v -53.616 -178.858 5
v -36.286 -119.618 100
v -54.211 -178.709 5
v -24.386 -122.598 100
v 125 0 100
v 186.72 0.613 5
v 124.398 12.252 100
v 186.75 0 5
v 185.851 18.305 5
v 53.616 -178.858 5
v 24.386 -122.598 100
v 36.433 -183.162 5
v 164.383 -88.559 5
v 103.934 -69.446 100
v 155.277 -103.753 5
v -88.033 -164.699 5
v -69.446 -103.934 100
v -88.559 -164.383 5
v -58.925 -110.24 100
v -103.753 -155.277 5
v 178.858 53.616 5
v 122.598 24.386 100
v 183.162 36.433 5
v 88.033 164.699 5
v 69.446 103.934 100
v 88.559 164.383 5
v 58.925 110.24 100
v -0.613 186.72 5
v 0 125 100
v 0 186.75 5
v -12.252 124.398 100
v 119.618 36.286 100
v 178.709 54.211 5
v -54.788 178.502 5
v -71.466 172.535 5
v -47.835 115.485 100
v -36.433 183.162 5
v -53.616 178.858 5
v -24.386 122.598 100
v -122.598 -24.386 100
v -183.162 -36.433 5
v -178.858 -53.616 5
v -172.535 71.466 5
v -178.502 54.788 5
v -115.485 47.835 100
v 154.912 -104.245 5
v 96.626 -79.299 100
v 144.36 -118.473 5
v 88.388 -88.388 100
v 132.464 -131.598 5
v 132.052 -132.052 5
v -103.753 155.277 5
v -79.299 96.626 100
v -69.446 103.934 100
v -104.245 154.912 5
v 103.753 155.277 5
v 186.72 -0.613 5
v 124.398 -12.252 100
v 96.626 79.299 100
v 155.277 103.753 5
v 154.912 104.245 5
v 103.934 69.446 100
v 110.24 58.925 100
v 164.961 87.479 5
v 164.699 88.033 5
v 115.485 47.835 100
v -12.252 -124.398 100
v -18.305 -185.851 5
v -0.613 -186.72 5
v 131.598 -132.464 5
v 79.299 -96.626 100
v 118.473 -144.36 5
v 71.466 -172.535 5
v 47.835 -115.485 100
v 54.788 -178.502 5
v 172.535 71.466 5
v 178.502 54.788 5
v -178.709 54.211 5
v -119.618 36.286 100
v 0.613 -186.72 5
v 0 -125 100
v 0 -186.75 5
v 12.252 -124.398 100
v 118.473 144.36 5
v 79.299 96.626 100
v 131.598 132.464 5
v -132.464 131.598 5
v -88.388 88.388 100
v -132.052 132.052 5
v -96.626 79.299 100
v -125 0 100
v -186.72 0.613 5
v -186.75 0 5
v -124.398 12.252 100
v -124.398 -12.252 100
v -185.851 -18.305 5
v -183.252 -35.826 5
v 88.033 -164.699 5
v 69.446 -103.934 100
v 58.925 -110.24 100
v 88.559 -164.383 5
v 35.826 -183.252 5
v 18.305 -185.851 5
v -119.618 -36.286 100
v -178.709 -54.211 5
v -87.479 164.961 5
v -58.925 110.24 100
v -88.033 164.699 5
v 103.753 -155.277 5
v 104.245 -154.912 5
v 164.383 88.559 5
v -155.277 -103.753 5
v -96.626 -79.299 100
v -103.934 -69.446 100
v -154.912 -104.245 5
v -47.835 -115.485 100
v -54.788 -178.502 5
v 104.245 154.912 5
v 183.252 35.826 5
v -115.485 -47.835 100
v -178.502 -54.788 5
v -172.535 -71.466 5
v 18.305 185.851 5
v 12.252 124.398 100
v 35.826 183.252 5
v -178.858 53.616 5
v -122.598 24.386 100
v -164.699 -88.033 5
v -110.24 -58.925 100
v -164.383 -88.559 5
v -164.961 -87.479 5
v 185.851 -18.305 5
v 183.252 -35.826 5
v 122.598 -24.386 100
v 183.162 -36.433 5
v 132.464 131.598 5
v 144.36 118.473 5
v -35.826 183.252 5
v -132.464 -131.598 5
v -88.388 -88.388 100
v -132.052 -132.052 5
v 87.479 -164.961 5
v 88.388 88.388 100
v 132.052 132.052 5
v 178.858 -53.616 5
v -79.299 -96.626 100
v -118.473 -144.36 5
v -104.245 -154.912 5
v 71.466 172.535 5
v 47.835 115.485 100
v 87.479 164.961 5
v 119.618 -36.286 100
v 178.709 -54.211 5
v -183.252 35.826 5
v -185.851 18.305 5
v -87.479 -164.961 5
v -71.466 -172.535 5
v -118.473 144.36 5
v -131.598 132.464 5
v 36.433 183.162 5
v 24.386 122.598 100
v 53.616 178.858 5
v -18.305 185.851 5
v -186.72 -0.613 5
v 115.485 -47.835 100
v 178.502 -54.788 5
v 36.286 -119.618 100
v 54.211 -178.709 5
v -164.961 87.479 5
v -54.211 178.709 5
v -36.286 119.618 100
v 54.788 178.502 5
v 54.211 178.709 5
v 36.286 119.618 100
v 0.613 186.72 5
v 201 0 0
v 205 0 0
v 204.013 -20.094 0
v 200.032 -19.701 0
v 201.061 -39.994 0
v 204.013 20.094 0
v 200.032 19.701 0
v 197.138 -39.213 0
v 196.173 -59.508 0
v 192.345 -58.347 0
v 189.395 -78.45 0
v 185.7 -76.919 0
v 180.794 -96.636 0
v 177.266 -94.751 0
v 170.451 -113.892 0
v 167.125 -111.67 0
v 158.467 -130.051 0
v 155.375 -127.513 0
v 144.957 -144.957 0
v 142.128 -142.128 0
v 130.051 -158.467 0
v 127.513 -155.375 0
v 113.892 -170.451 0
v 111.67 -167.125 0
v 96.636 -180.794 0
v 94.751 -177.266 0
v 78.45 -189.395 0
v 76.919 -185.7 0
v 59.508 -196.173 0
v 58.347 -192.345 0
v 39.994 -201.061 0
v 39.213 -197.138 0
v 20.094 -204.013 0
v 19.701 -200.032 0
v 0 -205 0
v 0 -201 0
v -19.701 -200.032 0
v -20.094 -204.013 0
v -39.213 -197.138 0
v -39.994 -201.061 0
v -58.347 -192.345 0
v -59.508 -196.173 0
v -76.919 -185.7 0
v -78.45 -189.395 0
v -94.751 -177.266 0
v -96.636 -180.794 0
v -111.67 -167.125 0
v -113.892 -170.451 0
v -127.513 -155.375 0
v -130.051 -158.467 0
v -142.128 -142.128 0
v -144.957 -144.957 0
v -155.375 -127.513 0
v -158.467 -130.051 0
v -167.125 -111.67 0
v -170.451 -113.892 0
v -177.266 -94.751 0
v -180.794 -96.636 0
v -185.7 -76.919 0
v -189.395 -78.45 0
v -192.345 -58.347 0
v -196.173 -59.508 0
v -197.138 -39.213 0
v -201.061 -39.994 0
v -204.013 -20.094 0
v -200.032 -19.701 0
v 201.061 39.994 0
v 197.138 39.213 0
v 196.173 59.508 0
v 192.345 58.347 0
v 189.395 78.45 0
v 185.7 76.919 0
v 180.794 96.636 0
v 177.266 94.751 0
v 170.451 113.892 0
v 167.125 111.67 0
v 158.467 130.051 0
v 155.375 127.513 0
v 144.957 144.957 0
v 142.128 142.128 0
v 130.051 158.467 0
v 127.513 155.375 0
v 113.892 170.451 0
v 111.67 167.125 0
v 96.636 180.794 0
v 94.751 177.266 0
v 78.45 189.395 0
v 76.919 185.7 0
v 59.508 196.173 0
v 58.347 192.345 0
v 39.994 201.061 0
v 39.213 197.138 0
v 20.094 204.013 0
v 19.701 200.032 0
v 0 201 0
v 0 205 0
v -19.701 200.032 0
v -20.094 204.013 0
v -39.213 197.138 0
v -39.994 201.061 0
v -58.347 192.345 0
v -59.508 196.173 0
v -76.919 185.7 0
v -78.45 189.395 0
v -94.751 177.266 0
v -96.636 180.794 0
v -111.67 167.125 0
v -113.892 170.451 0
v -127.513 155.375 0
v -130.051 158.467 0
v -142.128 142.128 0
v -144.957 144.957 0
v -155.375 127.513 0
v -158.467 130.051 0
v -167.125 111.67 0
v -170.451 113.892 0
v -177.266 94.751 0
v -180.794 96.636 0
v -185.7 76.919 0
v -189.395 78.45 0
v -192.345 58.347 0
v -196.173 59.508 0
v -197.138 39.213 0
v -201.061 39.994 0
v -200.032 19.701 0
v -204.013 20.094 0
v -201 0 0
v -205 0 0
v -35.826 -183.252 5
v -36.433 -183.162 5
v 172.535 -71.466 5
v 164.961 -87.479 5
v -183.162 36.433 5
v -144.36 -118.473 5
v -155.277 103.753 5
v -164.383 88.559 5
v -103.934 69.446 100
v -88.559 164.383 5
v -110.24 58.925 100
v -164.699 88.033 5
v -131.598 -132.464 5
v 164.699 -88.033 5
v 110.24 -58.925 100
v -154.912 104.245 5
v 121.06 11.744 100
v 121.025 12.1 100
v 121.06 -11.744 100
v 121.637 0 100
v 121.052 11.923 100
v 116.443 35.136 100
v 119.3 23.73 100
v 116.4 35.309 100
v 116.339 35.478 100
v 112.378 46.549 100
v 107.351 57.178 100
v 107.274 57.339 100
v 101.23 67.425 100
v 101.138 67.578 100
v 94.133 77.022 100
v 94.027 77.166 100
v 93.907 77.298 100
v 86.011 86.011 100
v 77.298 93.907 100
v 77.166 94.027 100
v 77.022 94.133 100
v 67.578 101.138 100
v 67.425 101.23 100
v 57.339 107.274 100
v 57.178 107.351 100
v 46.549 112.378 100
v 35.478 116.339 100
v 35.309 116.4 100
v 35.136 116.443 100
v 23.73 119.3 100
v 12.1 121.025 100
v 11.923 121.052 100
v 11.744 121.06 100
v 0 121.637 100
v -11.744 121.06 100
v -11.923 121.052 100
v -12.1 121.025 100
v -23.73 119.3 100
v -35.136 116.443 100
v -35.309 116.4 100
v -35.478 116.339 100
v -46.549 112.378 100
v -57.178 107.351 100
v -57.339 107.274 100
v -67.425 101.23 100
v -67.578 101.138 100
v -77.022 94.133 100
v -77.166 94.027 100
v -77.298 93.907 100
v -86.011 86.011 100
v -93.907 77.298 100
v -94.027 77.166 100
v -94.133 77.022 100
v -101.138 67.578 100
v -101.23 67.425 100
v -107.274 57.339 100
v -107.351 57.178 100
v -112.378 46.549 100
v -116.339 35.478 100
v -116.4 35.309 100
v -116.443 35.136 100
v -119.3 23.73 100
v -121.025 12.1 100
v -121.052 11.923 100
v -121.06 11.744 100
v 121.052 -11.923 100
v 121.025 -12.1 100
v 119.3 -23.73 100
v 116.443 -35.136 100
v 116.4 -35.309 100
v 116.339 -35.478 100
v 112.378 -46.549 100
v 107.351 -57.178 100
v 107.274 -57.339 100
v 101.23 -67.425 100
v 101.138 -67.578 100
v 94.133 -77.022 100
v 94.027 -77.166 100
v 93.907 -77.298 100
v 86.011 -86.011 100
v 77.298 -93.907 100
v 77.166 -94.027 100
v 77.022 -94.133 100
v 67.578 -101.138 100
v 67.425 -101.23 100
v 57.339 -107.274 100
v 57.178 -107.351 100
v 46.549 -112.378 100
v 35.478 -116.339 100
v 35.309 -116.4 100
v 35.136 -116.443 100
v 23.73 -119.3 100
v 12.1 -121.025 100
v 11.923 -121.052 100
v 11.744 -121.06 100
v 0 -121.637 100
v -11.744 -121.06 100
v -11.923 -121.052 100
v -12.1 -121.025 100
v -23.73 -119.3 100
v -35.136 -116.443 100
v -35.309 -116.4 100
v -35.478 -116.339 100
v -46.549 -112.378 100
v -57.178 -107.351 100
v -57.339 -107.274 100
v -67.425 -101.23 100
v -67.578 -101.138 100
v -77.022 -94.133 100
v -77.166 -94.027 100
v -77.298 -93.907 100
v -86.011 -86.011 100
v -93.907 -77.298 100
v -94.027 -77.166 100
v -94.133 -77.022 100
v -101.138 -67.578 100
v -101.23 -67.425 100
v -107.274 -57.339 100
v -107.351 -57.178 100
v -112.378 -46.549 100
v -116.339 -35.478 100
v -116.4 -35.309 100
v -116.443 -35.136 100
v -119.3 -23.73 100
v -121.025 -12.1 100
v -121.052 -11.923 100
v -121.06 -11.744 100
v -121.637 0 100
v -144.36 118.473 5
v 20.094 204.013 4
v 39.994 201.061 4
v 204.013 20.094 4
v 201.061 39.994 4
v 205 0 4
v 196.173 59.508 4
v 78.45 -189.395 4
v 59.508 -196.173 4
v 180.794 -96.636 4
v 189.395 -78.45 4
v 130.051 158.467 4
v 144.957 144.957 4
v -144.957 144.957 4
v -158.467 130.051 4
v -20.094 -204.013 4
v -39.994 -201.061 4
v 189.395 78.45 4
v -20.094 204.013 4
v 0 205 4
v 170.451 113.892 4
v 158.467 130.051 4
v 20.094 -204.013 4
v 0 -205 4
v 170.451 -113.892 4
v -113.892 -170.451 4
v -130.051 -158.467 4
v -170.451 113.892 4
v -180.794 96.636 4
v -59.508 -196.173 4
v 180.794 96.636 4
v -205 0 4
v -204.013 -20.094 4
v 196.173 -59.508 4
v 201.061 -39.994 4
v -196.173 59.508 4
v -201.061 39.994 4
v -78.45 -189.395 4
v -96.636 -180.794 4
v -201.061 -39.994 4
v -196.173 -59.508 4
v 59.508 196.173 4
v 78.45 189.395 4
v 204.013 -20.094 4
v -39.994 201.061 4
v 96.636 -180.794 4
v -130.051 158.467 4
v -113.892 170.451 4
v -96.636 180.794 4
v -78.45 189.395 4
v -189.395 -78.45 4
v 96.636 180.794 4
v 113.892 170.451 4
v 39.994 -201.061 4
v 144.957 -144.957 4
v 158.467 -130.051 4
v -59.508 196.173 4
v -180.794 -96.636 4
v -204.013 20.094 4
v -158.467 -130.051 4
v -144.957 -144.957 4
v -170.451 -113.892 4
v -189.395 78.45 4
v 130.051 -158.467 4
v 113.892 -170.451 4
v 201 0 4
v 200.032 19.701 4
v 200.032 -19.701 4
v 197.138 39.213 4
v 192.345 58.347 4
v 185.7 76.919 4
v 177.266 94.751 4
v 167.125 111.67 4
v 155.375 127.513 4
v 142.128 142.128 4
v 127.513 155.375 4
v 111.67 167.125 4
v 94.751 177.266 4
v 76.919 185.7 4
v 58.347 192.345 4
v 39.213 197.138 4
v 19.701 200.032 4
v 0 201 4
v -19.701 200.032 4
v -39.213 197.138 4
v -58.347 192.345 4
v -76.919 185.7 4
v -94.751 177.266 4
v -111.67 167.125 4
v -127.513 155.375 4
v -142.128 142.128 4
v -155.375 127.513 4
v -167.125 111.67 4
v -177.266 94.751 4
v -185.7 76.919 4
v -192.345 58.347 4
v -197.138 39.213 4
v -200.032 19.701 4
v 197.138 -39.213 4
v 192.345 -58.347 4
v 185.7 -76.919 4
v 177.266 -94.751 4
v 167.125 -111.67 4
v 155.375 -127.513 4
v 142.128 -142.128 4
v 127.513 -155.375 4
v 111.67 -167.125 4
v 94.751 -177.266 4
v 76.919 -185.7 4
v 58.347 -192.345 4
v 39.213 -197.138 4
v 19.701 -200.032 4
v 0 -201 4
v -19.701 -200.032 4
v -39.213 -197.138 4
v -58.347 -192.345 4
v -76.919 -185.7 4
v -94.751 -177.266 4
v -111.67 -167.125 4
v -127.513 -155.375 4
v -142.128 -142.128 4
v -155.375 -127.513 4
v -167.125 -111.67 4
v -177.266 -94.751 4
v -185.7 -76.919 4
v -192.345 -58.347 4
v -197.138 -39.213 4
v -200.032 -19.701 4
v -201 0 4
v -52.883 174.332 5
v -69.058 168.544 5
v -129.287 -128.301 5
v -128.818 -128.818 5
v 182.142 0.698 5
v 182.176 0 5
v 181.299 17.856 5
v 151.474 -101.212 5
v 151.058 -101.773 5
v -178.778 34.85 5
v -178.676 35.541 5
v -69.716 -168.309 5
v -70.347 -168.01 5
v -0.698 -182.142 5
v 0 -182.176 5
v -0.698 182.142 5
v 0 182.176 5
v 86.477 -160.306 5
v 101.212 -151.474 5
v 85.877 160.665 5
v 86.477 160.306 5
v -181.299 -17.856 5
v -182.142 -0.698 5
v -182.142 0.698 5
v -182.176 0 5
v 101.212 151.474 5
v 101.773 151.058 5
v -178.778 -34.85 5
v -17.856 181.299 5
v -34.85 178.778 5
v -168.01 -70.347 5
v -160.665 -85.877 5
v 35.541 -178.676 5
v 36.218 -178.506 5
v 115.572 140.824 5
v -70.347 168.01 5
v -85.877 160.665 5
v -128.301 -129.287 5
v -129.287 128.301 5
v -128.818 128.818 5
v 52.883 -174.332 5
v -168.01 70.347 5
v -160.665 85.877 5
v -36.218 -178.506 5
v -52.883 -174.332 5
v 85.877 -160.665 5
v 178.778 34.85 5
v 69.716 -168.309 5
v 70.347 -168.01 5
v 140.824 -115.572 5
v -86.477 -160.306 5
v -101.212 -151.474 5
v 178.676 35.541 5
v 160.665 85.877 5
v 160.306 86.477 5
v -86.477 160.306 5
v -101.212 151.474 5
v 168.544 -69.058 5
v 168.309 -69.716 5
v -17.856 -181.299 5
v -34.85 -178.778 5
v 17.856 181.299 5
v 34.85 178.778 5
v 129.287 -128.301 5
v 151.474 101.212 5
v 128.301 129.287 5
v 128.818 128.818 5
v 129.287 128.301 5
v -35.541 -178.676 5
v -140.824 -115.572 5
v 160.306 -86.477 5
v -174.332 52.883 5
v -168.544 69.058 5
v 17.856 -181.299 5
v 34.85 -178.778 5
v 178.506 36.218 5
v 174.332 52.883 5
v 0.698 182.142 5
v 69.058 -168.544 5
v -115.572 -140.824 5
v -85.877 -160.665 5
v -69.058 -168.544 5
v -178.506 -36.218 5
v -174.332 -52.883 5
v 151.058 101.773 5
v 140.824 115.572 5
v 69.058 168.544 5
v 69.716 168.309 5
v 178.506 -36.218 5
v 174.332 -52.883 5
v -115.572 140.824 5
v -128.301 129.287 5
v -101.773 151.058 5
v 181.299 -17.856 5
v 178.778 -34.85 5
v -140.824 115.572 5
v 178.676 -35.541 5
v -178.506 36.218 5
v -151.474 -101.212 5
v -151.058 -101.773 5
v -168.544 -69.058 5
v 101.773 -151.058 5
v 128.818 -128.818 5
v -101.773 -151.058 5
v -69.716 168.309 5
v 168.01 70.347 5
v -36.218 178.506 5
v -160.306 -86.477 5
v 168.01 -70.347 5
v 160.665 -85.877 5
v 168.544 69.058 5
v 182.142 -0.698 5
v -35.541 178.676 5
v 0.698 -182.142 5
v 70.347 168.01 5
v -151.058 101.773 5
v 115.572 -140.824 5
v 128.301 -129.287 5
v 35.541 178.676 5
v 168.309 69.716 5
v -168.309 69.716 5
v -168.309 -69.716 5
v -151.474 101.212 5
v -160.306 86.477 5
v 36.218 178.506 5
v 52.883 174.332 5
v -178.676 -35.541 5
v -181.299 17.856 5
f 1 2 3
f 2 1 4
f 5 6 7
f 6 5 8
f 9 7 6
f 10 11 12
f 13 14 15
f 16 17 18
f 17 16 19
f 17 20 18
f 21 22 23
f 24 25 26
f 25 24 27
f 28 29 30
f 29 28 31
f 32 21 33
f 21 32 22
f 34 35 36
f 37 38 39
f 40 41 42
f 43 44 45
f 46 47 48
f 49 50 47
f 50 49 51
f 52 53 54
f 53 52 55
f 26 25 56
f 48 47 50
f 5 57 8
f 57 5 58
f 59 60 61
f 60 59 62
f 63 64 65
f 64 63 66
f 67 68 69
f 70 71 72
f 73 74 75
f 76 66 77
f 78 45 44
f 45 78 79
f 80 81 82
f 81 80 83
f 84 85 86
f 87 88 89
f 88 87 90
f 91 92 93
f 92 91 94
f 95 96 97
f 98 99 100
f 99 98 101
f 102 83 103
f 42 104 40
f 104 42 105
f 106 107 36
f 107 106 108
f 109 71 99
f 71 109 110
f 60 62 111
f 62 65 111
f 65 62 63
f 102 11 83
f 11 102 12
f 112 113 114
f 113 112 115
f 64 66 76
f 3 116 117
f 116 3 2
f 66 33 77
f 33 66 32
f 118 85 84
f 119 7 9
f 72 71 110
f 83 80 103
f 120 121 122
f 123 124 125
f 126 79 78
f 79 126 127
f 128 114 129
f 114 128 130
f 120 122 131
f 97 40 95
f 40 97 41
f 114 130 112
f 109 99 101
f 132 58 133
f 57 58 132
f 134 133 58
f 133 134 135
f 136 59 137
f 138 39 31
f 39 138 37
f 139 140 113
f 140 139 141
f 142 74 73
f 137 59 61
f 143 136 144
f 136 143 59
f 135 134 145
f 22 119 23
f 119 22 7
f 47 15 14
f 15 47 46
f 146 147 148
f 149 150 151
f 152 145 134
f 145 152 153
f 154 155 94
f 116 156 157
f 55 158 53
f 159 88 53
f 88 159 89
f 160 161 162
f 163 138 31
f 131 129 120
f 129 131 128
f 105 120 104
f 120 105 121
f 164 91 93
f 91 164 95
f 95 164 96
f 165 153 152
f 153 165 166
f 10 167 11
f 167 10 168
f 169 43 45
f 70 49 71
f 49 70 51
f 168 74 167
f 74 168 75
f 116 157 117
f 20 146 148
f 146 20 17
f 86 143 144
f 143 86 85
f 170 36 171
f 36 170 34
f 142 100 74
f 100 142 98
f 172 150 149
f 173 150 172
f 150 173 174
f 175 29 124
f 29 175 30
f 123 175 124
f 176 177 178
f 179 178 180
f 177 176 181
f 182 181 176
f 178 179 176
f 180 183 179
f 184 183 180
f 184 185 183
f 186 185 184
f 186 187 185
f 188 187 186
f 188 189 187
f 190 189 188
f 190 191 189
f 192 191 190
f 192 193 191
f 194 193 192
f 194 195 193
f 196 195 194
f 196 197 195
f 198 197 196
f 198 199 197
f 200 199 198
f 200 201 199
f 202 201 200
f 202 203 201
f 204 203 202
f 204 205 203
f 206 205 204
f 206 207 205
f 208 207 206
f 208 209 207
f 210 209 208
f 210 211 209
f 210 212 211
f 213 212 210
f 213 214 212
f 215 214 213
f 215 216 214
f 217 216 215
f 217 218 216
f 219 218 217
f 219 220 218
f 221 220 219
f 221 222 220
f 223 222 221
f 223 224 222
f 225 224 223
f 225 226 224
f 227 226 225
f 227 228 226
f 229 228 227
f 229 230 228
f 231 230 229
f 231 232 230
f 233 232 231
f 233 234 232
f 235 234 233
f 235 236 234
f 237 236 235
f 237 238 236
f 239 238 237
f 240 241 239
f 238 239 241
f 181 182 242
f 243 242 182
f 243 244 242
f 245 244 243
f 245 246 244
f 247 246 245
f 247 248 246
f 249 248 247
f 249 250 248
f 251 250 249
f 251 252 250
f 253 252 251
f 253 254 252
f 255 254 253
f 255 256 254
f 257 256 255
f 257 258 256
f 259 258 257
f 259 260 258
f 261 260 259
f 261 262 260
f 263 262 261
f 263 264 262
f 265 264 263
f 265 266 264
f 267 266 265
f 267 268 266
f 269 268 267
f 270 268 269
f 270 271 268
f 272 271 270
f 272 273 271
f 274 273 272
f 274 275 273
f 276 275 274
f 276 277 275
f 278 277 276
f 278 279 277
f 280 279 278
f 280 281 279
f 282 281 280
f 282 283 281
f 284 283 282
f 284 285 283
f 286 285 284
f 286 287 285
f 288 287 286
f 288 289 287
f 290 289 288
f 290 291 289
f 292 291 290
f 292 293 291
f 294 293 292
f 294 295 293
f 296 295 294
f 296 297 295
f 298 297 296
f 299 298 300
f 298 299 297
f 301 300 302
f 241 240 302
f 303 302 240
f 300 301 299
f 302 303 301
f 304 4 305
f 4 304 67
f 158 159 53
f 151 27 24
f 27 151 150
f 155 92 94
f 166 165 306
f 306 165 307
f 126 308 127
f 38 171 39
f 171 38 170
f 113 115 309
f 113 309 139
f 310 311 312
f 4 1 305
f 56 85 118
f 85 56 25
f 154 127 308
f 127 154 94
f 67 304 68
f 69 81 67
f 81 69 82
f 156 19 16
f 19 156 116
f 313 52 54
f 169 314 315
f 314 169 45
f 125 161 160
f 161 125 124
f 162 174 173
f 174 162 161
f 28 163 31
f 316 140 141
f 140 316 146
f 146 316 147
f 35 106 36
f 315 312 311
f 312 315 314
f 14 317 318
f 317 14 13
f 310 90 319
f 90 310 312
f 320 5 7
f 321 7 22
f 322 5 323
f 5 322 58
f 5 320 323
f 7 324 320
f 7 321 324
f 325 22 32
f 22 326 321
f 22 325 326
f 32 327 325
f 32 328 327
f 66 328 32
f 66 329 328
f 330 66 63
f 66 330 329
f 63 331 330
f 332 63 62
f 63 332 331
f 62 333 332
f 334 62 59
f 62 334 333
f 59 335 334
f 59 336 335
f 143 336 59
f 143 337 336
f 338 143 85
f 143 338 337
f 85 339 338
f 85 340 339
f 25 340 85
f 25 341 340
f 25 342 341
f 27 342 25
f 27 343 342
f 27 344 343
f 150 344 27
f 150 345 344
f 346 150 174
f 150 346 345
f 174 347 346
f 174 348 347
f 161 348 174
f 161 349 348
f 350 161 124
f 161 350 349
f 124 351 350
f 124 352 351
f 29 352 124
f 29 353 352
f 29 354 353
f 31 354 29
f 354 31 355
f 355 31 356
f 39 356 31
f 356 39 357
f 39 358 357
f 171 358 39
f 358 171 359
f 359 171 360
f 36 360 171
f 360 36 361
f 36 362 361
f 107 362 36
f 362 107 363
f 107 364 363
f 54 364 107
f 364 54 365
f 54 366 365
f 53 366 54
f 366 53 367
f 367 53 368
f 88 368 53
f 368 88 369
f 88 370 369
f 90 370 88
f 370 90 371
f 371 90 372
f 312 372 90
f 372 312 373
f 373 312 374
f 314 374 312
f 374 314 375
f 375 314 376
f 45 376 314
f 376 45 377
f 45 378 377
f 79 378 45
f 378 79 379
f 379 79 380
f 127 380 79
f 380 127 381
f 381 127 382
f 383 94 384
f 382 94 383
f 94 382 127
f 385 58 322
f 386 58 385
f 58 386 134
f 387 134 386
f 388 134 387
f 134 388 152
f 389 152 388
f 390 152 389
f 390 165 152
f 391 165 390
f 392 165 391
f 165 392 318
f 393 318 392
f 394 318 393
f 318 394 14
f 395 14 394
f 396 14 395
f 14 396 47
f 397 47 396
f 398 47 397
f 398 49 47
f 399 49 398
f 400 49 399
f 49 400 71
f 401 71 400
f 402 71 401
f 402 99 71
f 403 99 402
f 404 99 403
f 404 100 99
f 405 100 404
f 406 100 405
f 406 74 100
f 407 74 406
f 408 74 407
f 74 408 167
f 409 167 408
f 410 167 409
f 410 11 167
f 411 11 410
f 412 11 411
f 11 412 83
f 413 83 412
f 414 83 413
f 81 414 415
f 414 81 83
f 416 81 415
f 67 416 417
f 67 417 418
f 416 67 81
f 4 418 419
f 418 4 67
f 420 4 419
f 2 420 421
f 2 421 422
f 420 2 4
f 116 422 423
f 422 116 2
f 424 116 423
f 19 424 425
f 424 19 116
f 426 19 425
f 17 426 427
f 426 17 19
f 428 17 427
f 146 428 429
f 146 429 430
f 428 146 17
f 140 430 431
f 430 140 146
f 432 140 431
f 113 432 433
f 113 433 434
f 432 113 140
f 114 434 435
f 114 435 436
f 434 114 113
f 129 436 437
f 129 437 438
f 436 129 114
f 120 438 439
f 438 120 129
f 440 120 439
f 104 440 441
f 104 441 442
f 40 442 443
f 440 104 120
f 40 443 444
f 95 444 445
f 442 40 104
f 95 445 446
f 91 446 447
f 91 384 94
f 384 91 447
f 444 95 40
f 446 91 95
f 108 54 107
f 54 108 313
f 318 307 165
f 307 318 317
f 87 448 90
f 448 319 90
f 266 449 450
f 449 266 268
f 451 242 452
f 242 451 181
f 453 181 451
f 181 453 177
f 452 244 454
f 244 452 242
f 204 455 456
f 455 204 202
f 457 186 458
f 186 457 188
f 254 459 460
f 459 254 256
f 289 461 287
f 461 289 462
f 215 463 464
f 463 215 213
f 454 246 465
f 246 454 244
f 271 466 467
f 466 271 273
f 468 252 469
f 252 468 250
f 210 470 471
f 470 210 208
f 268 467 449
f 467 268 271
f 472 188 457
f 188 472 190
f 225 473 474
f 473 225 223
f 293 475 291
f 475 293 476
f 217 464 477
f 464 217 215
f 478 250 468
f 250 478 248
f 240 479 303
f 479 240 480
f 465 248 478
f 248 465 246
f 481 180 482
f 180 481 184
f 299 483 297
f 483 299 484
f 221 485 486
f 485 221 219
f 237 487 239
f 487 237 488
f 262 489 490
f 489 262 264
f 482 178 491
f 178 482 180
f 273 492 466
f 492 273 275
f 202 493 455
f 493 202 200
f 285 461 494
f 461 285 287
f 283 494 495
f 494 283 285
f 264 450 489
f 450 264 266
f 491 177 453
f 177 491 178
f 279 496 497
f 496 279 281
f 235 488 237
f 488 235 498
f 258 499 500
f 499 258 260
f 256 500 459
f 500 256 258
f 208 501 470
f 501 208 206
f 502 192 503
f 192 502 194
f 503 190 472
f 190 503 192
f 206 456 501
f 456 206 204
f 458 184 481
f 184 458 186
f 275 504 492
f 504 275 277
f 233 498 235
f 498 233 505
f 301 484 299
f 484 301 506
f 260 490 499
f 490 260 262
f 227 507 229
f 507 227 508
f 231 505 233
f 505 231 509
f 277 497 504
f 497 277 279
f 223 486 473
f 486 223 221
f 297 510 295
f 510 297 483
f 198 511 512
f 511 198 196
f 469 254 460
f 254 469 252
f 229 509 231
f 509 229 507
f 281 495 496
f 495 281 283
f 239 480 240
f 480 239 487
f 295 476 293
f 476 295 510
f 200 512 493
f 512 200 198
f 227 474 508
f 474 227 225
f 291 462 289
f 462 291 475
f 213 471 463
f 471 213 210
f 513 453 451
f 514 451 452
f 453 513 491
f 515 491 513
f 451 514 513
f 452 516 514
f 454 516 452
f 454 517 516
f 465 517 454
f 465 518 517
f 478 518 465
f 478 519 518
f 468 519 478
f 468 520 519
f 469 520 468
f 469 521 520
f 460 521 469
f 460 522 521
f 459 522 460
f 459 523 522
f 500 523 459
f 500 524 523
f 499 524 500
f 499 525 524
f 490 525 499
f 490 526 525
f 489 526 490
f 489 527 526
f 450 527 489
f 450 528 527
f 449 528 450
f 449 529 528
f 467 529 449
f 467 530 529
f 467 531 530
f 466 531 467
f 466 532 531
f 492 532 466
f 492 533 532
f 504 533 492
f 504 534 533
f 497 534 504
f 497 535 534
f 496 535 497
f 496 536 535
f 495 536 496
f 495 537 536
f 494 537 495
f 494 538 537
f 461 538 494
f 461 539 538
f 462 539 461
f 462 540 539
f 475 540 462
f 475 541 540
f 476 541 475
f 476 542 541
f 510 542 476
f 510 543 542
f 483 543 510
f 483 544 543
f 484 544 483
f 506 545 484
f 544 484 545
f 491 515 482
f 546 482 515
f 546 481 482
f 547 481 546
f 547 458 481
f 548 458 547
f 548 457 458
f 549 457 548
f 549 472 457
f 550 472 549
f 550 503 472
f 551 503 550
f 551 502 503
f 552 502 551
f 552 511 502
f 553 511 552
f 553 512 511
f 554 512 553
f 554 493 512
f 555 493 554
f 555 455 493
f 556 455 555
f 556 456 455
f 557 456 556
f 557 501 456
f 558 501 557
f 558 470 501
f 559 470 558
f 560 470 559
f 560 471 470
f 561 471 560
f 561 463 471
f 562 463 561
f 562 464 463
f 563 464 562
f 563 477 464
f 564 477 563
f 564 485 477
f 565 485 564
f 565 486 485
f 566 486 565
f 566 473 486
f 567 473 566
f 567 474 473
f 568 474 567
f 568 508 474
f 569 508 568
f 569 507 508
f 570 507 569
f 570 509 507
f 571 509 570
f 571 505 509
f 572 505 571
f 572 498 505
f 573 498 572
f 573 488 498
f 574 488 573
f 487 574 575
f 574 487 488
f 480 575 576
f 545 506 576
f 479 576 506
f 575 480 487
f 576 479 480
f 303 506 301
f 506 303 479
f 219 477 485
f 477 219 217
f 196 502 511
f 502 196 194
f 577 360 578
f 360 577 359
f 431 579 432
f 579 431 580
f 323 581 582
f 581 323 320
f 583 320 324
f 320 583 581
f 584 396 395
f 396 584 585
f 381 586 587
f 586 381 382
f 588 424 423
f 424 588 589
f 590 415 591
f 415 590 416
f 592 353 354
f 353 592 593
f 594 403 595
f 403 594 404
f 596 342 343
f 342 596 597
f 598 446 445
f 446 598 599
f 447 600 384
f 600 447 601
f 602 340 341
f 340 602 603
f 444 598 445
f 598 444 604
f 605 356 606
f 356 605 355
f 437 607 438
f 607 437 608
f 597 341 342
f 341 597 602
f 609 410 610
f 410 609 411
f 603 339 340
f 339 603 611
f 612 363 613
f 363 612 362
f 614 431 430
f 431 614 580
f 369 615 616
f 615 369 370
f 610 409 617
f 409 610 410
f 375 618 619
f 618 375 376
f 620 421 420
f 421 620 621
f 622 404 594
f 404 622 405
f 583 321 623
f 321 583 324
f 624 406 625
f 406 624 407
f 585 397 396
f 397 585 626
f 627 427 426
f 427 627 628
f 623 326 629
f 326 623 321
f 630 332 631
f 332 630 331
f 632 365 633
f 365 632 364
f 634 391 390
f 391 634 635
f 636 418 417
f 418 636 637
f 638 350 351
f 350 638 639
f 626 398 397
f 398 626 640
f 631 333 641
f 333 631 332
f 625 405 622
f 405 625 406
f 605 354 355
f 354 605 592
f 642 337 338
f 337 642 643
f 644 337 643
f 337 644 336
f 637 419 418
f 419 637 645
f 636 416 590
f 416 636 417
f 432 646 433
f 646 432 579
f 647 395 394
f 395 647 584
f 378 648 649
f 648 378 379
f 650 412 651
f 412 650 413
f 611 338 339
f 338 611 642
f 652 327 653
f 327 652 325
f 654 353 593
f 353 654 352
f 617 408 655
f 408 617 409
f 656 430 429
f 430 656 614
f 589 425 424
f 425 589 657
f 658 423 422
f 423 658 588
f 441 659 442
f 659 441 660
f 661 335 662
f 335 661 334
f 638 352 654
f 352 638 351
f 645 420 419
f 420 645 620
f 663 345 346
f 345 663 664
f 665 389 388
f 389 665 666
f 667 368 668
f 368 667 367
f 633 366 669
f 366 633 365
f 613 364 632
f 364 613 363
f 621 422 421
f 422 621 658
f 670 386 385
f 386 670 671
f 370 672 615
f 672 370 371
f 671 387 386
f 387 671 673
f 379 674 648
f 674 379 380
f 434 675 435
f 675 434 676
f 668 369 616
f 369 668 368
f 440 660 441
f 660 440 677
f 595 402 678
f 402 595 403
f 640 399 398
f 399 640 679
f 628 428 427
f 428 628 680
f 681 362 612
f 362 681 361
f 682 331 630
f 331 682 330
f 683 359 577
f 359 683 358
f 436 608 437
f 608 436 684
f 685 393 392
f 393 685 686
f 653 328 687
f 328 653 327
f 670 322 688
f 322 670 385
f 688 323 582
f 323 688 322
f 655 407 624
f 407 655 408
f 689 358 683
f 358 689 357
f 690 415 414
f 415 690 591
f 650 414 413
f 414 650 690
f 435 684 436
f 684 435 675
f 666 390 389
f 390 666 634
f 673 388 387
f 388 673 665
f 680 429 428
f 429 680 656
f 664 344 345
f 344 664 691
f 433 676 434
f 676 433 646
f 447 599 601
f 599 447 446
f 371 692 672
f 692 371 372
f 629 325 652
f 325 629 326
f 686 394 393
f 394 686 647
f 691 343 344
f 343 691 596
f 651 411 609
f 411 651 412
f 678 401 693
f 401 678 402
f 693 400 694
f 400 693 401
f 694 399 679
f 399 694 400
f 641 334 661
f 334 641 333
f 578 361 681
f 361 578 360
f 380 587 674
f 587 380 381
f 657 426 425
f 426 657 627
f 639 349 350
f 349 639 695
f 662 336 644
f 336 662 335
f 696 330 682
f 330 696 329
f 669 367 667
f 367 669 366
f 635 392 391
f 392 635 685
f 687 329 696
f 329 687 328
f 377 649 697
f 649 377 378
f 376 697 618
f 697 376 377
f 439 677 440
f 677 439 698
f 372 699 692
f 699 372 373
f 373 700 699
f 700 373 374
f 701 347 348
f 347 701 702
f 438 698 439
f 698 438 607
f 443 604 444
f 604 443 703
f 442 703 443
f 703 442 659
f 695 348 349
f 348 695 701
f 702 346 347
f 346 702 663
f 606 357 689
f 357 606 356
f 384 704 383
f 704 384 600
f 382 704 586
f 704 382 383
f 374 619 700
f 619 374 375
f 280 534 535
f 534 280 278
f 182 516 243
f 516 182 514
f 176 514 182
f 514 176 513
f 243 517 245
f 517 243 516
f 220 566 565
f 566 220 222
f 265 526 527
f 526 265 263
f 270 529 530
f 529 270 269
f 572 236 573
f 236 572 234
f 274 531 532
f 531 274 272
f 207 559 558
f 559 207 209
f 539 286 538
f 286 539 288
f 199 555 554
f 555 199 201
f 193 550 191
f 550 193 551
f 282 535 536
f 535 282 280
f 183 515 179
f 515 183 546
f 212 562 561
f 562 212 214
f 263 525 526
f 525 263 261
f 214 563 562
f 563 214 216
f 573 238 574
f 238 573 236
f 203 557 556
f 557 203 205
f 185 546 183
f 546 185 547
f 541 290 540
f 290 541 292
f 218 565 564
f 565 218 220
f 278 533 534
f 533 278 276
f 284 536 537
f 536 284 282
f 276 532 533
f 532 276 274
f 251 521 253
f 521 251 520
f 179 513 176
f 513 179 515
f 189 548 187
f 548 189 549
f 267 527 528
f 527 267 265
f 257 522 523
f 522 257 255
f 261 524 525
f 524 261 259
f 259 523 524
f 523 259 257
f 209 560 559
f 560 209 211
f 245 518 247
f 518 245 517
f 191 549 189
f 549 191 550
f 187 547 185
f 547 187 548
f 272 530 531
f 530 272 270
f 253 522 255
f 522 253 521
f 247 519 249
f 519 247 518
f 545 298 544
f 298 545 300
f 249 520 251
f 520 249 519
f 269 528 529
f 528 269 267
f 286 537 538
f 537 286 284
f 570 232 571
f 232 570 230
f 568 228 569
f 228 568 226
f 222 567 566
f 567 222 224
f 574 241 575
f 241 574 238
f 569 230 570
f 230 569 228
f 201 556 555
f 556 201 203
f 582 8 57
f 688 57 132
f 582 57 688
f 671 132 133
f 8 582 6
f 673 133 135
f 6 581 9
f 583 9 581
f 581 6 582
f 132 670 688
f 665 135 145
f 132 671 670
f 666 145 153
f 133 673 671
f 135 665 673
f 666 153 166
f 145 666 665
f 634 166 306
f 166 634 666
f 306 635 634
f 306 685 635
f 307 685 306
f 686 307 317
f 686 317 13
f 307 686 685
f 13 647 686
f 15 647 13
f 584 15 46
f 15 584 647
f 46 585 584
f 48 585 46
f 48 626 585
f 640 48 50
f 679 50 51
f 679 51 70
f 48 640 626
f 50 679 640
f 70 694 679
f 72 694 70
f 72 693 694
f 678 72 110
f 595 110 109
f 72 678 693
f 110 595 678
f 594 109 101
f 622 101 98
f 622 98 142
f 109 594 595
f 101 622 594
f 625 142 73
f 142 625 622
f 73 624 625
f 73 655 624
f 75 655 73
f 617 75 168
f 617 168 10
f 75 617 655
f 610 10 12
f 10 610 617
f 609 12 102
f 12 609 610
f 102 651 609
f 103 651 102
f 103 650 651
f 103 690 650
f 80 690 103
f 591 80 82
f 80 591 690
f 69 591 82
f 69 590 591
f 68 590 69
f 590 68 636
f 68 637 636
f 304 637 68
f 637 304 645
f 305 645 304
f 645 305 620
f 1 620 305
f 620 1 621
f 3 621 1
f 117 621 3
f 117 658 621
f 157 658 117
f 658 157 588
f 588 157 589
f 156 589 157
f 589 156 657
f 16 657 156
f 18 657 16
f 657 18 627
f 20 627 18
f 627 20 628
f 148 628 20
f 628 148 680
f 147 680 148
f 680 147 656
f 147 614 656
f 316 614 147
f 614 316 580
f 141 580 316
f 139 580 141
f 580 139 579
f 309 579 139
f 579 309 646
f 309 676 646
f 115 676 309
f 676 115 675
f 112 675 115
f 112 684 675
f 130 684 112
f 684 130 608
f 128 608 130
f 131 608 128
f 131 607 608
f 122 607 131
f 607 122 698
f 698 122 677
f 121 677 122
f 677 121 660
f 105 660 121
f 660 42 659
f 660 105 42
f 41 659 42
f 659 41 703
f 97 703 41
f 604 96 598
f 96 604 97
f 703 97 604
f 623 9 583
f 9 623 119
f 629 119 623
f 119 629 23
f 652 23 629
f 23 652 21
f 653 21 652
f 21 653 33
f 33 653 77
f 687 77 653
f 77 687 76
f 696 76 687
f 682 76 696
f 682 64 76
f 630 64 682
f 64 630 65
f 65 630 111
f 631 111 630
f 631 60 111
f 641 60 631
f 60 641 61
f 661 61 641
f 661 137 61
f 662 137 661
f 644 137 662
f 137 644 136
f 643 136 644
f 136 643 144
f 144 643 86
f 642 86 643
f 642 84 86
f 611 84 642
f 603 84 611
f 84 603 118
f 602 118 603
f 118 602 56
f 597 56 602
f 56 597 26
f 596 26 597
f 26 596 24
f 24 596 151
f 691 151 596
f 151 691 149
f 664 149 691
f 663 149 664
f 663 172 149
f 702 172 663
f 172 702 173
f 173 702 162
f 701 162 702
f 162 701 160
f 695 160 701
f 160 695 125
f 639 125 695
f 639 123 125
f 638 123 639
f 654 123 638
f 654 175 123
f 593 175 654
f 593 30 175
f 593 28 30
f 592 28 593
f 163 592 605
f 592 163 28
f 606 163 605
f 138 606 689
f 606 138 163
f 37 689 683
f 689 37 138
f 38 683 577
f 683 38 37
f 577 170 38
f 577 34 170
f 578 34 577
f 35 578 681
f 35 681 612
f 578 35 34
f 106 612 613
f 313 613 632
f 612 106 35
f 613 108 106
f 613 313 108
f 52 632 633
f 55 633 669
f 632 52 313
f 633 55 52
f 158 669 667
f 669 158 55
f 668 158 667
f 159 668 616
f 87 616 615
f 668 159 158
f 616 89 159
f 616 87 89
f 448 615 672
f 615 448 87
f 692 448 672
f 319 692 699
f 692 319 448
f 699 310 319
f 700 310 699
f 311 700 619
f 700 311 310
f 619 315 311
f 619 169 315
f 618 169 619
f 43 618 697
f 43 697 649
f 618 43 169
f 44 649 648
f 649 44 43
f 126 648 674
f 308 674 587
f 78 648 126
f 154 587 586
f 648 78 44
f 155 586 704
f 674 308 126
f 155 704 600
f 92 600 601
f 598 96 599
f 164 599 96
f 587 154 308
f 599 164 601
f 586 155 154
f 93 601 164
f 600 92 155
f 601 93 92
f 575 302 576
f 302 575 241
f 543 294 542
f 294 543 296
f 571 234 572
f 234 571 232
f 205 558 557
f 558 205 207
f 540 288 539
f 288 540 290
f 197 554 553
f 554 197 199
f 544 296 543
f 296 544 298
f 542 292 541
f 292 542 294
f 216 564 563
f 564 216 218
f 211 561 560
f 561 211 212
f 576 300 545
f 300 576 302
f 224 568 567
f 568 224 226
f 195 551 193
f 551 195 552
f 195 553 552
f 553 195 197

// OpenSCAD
// Parametric Flower-Shaped Rainwater Collector
// Designed for retrofitting onto a Tinaco (water tank).

/* [Tank Interface] */
// Diameter of the tank opening (mm)
tank_opening_diameter = 400; 
// Thickness of the funnel wall (mm)
wall_thickness = 4;

/* [Flower Geometry] */
// Number of petals
petal_count = 6;
// Length of each petal from the funnel (mm)
petal_length = 200;
// Width of each petal at its widest point (mm)
petal_width = 120;
// Thickness of the petal (mm)
petal_thickness = 3;
// Angle of the petals relative to the horizontal plane (degrees)
petal_angle = 30;

/* [Central Funnel] */
// Diameter of the funnel top (mm)
funnel_top_diameter = 250;
// Height of the funnel above the tank rim (mm)
funnel_height = 100;

// --- Internal Settings ---
$fn = 64;

// --- Modules ---

module petal() {
    // Creates a single petal using a scaled and deformed sphere-like shape
    // to create a concave surface for water collection.
    difference() {
        // Outer shell
        scale([petal_length / 2, petal_width / 2, petal_thickness / 2])
        sphere(r = 1);
        
        // Inner hollow
        scale([(petal_length / 2) - petal_thickness, 
               (petal_width / 2) - petal_thickness, 
               0.1])
        sphere(r = 1);
        
        // Cut the petal in half to make it a shell
        translate([-petal_length/2, -petal_width/2, -petal_thickness/2])
        cube([petal_length, petal_width, petal_thickness]);
    }
}

module collector() {
    // 1. Central Funnel
    // The funnel directs water from the petals and the top area into the tank.
    difference() {
        union() {
            // Main funnel body
            cylinder(h = funnel_height, d1 = tank_opening_diameter - 20, d2 = funnel_top_diameter);
            // Flange to sit on the tank rim
            translate([0, 0, 0])
            cylinder(h = wall_thickness, d = tank_opening_diameter + 10);
        }
        
        // Hollow out the funnel
        translate([0, 0, -1])
        cylinder(h = funnel_height + 2, d1 = tank_opening_diameter - 20 - 2*wall_thickness, d2 = funnel_top_diameter - 2*wall_thickness);
        
        // Hollow out the flange
        translate([0, 0, -1])
        cylinder(h = wall_thickness + 2, d = tank_opening_diameter + 10 - 2*wall_thickness);
    }

    // 2. Petals
    // Arranged around the funnel to catch rain.
    for (i = [0 : petal_count - 1]) {
        rotate([0, 0, i * (360 / petal_count)])
        translate([funnel_top_diameter / 2, 0, funnel_height / 2])
        rotate([0, -petal_angle, 0])
        petal();
    }
}

// --- Execution ---
collector();
